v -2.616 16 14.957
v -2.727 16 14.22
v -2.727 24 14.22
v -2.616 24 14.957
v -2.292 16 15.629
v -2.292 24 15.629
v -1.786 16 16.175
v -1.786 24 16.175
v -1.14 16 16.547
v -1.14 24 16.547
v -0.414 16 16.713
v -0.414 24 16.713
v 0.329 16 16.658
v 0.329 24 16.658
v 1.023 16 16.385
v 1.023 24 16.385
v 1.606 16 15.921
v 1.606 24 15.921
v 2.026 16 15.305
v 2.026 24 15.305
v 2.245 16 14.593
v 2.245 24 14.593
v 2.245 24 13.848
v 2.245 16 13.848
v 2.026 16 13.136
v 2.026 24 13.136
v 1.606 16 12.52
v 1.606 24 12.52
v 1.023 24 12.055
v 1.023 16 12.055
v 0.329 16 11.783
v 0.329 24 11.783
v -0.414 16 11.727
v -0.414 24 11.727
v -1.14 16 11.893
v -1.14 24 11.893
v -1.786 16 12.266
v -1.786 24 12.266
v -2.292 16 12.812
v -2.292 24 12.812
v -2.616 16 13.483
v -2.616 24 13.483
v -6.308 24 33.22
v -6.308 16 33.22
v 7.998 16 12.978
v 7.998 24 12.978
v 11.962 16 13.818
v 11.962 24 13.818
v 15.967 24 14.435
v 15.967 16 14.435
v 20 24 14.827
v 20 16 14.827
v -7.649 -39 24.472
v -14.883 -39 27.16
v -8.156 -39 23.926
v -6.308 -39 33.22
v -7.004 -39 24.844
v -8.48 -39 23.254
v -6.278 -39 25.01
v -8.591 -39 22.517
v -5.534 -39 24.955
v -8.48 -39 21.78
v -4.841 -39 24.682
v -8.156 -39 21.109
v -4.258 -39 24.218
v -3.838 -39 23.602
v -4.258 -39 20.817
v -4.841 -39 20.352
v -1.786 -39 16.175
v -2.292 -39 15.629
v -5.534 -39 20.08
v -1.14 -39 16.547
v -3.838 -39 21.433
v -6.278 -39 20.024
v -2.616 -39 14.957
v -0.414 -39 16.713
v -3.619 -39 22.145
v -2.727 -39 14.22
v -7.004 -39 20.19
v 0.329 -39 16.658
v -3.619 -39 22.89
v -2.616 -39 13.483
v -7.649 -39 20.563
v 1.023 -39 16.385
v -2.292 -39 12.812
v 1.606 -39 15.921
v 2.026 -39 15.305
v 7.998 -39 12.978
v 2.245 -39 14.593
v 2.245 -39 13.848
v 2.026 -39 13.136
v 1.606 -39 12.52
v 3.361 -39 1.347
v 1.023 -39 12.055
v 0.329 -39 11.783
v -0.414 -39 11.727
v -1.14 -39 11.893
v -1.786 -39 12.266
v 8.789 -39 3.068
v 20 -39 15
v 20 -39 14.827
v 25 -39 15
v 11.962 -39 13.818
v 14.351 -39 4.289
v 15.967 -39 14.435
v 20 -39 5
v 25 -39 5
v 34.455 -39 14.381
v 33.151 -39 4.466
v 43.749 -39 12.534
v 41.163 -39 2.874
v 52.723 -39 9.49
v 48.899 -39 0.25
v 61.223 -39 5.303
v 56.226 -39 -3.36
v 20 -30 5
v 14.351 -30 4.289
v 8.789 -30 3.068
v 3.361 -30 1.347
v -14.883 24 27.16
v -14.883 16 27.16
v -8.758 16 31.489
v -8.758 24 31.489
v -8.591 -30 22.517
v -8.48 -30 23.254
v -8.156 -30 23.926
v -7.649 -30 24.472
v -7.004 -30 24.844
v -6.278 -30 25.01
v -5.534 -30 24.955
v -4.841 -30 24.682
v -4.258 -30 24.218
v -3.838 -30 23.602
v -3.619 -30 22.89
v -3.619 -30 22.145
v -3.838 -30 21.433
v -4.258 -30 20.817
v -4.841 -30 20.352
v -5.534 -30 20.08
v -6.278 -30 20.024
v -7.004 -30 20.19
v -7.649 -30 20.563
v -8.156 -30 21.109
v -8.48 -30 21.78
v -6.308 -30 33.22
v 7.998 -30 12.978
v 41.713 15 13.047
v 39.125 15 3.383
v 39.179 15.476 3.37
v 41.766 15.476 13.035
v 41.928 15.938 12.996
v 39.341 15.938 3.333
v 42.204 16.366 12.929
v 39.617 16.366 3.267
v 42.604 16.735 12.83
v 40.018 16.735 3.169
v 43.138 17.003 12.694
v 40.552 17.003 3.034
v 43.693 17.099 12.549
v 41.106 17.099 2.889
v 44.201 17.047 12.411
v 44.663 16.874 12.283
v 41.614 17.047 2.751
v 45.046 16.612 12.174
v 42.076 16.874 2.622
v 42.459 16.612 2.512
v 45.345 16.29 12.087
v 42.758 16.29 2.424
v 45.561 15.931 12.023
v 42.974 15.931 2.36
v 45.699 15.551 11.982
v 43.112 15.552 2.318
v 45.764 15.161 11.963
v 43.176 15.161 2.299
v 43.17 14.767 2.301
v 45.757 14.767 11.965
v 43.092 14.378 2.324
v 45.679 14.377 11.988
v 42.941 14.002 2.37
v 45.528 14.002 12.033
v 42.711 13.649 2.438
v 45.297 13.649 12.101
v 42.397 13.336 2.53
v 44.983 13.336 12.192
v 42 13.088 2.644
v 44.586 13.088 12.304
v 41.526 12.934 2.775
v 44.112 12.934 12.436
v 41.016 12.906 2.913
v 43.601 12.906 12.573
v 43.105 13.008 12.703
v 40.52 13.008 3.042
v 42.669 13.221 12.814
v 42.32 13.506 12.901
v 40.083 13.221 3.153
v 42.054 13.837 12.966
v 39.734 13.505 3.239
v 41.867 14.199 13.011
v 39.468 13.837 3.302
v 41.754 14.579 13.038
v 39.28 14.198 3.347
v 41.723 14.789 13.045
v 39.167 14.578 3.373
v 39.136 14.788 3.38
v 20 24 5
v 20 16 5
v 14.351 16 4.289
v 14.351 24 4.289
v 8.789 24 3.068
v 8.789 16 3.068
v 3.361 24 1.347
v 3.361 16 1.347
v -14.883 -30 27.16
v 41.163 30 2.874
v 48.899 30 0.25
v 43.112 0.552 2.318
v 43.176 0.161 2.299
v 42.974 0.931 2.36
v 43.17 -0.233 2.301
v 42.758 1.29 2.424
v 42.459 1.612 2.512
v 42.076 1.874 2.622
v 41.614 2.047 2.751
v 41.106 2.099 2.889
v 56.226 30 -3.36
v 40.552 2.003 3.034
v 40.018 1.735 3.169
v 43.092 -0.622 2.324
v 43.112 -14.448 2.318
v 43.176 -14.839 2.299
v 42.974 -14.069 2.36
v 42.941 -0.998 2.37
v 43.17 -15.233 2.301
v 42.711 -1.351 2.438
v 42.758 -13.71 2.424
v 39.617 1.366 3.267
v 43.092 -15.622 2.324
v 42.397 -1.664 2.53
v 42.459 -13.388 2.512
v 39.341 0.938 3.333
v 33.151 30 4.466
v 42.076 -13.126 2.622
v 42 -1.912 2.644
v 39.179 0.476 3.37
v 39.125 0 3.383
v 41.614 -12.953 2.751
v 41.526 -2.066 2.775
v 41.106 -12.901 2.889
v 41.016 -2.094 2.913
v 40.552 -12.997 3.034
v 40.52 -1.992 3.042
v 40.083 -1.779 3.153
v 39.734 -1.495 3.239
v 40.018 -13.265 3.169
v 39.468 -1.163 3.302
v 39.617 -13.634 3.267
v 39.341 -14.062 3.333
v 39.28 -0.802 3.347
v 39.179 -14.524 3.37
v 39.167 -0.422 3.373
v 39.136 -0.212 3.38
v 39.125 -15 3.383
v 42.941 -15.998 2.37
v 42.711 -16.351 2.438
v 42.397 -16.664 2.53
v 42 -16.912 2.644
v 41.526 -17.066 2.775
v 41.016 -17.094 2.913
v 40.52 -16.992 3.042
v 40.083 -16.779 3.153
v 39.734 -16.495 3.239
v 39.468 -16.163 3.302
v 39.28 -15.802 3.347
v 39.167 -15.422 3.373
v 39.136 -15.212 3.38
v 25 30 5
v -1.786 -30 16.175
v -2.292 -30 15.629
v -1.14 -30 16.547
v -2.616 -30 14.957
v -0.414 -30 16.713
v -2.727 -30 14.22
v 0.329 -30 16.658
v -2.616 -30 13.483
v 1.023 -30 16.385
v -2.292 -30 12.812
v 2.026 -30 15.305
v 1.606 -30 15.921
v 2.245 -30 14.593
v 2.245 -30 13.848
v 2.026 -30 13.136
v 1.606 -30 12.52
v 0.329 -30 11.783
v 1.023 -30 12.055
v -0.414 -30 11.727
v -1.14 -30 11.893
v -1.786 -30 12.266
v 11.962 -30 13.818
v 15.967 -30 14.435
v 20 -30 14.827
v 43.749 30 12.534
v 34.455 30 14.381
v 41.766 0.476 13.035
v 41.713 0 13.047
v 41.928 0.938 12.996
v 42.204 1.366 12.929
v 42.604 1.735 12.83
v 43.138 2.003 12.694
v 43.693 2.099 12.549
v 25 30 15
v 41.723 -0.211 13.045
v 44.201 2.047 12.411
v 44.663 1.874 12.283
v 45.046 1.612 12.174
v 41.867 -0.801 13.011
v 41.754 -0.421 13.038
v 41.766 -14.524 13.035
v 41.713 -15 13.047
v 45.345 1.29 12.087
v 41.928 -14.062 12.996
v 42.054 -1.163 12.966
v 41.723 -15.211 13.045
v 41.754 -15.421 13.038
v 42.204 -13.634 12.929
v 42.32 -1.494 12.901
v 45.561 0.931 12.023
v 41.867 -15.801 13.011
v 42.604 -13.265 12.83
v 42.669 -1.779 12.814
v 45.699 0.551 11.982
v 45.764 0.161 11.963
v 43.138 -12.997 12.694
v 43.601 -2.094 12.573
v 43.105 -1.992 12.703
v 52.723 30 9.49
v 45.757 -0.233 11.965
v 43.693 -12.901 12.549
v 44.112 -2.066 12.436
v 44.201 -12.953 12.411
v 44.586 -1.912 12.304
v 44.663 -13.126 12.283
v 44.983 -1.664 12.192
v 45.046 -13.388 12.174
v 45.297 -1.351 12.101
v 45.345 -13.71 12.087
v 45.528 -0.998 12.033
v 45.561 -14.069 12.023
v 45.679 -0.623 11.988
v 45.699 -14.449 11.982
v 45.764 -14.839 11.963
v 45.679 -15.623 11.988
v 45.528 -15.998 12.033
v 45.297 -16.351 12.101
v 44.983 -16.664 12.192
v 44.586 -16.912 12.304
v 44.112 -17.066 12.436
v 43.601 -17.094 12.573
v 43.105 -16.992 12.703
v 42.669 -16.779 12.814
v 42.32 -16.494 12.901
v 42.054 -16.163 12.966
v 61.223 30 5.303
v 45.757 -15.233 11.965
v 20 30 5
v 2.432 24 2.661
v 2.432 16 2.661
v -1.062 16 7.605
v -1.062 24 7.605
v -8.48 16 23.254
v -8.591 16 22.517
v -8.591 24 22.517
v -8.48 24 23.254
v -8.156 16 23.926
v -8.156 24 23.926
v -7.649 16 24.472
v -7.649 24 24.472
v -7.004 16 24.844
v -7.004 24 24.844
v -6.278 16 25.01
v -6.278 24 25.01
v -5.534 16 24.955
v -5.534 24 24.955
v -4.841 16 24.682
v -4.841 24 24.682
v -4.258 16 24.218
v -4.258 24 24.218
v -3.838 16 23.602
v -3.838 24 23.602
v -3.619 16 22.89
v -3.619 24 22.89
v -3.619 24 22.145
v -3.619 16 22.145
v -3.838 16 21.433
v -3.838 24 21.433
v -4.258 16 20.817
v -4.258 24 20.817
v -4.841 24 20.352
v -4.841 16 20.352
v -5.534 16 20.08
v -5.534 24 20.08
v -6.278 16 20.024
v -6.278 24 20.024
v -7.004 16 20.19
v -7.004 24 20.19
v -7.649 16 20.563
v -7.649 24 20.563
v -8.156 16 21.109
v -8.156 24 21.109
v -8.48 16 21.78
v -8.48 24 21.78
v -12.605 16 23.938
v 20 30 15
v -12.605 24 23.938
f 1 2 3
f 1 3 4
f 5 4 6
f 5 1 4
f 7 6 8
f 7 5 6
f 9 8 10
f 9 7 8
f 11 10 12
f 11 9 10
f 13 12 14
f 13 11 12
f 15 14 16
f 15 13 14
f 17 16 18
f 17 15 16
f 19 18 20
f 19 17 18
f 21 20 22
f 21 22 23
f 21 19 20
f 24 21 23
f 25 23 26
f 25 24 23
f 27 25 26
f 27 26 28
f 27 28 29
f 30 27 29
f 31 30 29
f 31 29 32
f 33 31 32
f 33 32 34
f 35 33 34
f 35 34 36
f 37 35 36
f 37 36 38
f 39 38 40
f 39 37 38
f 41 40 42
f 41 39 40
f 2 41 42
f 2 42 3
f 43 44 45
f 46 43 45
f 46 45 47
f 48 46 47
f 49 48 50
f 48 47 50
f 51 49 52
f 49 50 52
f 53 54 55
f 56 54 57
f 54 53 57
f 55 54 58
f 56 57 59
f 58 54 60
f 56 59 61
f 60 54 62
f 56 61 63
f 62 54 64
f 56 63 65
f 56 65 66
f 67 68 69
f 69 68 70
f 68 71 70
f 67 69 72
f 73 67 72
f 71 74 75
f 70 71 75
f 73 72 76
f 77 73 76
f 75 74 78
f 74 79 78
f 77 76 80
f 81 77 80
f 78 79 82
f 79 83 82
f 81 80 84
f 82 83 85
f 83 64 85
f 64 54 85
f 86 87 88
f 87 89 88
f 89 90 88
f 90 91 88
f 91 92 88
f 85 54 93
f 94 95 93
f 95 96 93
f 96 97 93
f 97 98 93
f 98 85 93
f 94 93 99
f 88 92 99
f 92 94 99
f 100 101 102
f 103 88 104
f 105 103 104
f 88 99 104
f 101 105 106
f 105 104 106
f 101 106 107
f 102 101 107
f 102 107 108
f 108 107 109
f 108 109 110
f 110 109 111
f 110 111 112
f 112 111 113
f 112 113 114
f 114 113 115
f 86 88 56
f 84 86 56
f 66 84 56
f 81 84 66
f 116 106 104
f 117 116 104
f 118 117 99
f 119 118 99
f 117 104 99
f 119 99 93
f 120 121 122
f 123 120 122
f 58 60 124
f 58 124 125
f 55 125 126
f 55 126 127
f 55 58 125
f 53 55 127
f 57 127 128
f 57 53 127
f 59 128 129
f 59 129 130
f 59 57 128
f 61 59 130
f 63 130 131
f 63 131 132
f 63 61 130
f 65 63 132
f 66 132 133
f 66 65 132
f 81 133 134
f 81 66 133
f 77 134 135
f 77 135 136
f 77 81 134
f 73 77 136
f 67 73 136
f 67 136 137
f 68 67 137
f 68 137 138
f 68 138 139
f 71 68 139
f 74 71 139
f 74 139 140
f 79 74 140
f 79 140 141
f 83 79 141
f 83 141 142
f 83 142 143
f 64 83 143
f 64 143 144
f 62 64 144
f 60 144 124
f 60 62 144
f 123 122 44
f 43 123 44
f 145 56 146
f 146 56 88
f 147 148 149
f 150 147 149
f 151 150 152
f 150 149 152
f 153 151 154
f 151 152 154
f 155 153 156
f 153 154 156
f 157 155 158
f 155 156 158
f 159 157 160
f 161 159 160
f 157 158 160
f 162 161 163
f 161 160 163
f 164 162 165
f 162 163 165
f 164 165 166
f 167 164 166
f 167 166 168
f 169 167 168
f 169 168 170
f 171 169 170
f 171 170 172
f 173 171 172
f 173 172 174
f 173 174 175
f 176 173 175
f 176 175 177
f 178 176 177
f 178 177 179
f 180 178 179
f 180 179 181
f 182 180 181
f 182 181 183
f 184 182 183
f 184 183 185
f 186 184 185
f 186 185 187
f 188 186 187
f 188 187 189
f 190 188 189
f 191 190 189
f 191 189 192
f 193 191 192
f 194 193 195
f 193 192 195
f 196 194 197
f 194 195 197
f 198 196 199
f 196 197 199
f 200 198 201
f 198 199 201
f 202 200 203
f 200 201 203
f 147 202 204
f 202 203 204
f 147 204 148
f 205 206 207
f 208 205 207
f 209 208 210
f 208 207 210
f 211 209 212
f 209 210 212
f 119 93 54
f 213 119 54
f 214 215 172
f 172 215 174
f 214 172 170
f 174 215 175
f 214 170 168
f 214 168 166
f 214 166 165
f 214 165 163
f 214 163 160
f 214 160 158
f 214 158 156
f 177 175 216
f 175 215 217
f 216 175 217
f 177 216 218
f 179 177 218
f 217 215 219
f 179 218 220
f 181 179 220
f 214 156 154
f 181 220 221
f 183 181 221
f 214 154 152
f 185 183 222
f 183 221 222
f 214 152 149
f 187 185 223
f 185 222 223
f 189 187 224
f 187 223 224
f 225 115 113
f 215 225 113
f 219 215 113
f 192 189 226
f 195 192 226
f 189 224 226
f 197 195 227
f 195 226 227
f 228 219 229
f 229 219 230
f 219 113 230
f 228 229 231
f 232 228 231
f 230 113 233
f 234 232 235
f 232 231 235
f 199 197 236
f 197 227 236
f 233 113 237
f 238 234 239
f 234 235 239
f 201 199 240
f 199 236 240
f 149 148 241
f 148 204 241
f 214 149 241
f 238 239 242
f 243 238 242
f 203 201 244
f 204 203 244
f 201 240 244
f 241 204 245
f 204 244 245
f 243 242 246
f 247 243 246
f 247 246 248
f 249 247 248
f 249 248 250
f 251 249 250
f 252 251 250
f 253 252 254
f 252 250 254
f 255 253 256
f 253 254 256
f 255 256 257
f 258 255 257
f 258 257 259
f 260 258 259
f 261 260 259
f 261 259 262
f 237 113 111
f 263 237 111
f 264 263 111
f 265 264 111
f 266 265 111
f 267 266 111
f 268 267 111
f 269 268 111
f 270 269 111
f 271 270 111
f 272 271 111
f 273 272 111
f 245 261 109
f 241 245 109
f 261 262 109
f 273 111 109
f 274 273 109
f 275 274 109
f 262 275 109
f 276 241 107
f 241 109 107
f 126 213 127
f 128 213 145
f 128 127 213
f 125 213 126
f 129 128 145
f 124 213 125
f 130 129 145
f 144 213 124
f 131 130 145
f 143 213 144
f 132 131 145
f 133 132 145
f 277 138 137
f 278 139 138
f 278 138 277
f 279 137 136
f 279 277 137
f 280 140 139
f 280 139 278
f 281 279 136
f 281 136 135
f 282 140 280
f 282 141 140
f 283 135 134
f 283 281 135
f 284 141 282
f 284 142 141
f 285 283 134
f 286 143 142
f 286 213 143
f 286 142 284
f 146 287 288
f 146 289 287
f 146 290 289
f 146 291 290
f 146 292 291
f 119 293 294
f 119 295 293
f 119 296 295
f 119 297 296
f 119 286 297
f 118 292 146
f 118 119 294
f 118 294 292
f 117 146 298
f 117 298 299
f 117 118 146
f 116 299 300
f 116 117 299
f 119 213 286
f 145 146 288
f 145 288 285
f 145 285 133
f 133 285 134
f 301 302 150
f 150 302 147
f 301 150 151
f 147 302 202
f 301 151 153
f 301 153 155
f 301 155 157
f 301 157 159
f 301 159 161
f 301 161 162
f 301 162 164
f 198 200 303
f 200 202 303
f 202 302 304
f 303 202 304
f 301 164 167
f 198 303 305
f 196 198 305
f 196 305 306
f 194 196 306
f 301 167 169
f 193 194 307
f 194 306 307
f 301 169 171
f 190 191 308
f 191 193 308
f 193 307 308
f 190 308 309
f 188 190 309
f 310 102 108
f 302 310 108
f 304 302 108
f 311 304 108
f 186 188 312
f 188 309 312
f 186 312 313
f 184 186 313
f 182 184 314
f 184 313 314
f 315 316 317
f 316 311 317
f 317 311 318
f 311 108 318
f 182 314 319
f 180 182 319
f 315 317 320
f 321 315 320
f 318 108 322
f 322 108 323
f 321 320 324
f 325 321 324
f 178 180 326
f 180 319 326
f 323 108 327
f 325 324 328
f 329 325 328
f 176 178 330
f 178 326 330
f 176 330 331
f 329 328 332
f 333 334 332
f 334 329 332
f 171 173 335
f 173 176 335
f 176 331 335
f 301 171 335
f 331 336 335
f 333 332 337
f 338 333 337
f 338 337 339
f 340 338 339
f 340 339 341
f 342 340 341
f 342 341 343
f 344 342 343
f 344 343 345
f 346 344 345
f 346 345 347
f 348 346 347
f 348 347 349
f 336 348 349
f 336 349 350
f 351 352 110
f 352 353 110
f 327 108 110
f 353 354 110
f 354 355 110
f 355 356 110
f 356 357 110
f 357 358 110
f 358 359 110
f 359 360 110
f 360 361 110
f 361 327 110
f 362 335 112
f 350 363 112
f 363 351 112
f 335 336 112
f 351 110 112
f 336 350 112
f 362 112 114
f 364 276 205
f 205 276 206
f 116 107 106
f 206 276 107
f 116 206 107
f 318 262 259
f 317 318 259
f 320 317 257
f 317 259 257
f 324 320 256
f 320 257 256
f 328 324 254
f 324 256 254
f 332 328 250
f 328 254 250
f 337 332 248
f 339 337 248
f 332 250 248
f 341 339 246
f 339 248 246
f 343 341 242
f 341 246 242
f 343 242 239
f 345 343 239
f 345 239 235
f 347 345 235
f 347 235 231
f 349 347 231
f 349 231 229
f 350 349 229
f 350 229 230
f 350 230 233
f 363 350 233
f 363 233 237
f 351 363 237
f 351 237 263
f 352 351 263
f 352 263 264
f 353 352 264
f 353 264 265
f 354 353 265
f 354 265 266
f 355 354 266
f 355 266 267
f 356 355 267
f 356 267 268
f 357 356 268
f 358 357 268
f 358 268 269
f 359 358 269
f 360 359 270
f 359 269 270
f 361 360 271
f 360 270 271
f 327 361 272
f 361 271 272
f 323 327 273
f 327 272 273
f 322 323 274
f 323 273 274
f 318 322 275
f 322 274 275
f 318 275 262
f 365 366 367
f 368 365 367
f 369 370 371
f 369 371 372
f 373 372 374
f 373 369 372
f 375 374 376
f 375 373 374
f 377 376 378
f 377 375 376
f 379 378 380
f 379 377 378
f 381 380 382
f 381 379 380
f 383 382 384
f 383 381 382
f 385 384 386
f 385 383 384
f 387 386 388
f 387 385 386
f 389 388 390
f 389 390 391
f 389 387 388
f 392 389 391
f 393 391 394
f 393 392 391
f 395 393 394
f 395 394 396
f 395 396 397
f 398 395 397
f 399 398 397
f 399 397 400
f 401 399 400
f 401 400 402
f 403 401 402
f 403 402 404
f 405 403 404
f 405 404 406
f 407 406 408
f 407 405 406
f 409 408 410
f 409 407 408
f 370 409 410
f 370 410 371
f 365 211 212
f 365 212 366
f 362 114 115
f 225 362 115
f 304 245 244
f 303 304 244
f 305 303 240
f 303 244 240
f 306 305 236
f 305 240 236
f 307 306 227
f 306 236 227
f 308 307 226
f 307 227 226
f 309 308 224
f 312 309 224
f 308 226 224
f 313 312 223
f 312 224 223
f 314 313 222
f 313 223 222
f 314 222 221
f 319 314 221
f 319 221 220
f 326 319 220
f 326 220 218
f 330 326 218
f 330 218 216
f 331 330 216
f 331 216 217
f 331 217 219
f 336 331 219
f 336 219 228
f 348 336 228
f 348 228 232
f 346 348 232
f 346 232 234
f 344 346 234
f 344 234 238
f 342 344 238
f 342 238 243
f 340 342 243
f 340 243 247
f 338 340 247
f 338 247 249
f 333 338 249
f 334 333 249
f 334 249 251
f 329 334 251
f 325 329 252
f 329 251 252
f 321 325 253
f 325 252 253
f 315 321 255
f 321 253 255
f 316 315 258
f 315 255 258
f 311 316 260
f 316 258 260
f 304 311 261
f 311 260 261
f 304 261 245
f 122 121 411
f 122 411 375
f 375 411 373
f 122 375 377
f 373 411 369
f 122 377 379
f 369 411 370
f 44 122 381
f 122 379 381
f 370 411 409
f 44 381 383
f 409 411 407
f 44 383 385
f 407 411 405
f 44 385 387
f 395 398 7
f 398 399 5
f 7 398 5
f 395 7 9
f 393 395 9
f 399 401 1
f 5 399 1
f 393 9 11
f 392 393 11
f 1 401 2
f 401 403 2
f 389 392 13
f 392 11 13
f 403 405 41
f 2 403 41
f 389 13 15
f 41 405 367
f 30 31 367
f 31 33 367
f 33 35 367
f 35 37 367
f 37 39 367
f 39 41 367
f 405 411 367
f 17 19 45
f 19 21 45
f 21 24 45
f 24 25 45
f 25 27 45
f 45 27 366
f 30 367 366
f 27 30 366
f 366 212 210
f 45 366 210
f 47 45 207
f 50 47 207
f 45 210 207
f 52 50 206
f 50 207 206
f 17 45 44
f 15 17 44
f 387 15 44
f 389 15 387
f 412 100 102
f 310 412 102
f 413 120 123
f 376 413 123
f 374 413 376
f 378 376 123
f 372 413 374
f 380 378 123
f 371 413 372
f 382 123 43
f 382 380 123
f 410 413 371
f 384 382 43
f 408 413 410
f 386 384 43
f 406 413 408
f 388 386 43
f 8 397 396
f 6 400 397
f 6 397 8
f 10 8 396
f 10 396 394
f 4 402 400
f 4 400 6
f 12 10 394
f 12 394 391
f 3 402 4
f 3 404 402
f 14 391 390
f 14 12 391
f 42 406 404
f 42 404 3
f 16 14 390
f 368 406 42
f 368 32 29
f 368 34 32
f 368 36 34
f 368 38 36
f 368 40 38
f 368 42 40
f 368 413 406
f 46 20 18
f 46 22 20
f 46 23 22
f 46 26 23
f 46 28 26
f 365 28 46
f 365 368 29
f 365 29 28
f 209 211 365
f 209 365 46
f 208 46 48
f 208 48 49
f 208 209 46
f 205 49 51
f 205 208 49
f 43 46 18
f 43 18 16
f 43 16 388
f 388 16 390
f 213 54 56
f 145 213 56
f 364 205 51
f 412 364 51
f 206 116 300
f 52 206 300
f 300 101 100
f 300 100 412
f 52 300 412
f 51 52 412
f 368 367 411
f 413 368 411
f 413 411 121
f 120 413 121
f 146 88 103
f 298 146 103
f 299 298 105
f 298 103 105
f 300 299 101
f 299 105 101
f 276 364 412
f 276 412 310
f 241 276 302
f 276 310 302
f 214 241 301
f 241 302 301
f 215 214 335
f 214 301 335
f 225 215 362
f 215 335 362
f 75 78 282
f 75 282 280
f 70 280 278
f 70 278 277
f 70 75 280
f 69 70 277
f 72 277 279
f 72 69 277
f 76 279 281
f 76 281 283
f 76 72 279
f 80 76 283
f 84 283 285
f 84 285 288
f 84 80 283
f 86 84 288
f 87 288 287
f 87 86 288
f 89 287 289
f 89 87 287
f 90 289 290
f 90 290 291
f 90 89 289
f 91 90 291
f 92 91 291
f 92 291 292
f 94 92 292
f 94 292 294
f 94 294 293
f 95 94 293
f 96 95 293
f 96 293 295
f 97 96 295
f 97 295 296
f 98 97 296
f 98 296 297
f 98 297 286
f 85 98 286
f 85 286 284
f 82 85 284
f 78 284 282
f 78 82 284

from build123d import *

# Parameters (mm, degrees)
BOSS_EXTRUDE2_DEPTH = 20
FILLET1_RADIUS      = 10
FILLET1_LENGTH      = 5
FILLET2_RADIUS      = 10
FILLET2_LENGTH      = 5
SKETCH5_R           = 1
SKETCH5_R_2         = 5.5
CUT_EXTRUDE5_DEPTH  = 69.007352544
CUT_EXTRUDE7_DEPTH  = 25
FILLET5_R           = 10
BOSS_EXTRUDE5_DEPTH = 60
SKETCH13_R          = 2.1
CUT_EXTRUDE8_DEPTH  = 60
CUT_EXTRUDE9_DEPTH  = 60
CUT_EXTRUDE10_DEPTH = 60
SKETCH17_R          = 2.5
BOSS_EXTRUDE6_DEPTH = 8
SKETCH18_R          = 2.5
BOSS_EXTRUDE7_DEPTH = 9


with BuildPart() as part:
    # Sketch1 → Boss-Extrude2 (new body)
    with BuildSketch(Plane.XY):
        Polygon((-25, 30), (25, 30), (25, -30), (-25, -30), (-25, -25), (-20, -25), (20, -25), (20, 25), (-20, 25), (-25, 25), align=None)
    extrude(amount=BOSS_EXTRUDE2_DEPTH)

    # Fillet1: full round fillet: the end face becomes a half cylinder, R = half its width
    fillet1_face = Plane((-25, 27.5, 10), x_dir=(0, -1, 0), z_dir=(-1, 0, 0))  # on the end face: x along it, z out of the body
    fillet1_slab = fillet1_face.offset(-FILLET1_RADIUS / 2) * Box(FILLET1_LENGTH, 2 * FILLET1_RADIUS, FILLET1_RADIUS, mode=Mode.PRIVATE)  # the body's end, R deep
    fillet1_round = Plane((-15, 27.5, 10), x_dir=(-1, 0, 0), z_dir=(0, -1, 0)) * Cylinder(FILLET1_RADIUS, FILLET1_LENGTH, mode=Mode.PRIVATE)  # its axis R under the face
    add(fillet1_slab - fillet1_round, mode=Mode.SUBTRACT)

    # Fillet2: full round fillet: the end face becomes a half cylinder, R = half its width
    fillet2_face = Plane((-25, -27.5, 10), x_dir=(0, -1, 0), z_dir=(-1, 0, 0))  # on the end face: x along it, z out of the body
    fillet2_slab = fillet2_face.offset(-FILLET2_RADIUS / 2) * Box(FILLET2_LENGTH, 2 * FILLET2_RADIUS, FILLET2_RADIUS, mode=Mode.PRIVATE)  # the body's end, R deep
    fillet2_round = Plane((-15, -27.5, 10), x_dir=(-1, 0, 0), z_dir=(0, -1, 0)) * Cylinder(FILLET2_RADIUS, FILLET2_LENGTH, mode=Mode.PRIVATE)  # its axis R under the face
    add(fillet2_slab - fillet2_round, mode=Mode.SUBTRACT)

    # Sketch5 → Cut-Extrude5 (cut, through all)
    with BuildSketch(Plane(origin=(0, 30, 0), x_dir=(1, 0, 0), z_dir=(0, 1, 0))):
        with Locations(Location((-15, -3, 0), (0, 0, 180))):
            Circle(SKETCH5_R)
        with Locations(Location((-22, -10, 0), (0, 0, 180))):
            Circle(SKETCH5_R)
        with Locations(Location((-15, -17, 0), (0, 0, 180))):
            Circle(SKETCH5_R)
        with Locations(Location((-8, -10, 0), (0, 0, 180))):
            Circle(SKETCH5_R)
        with Locations(Location((-15, -10, 0), (0, 0, 180))):
            Circle(SKETCH5_R_2)
    extrude(amount=-CUT_EXTRUDE5_DEPTH, mode=Mode.SUBTRACT)

    # Sketch10 → Cut-Extrude7 (cut)
    with BuildSketch(Plane(origin=(25, 0, 0), x_dir=(0, 0, -1), z_dir=(1, 0, 0))):
        Polygon((-15, 28.180148829), (-15, -28.180148829), (-15, -30), (-20, -30), (-20, 30), (-15, 30), align=None)
        Polygon((-5, 28.180148829), (-5, -28.180148829), (-5, -30), (0, -30), (0, 30), (-5, 30), align=None)
    extrude(amount=-CUT_EXTRUDE7_DEPTH, mode=Mode.SUBTRACT)

    # Fillet5
    # the kernel refuses this fillet: 10 mm, written as the material it adds along each edge
    with BuildSketch(Plane(origin=(0, 25, 15), x_dir=(1, 0, 0), z_dir=(0, 1, 0)), Plane(origin=(0, -30, 15), x_dir=(1, 0, 0), z_dir=(0, 1, 0)), Plane(origin=(0, -25, 5), x_dir=(1, 0, 0), z_dir=(0, -1, 0))) as fillet5_piece_1:
        with BuildLine():
            CenterArc((8.660254038, -10), FILLET5_R, 90, 60)
            Line((0, -5), (-0.173205081, -4.9))
            ThreePointArc((-0.173205081, -4.9), (-0.2, -2.5), (-0.2, 0))
            Line((-0.2, 0), (0, 0.2))
            Line((0, 0.2), (8.660254038, 0.2))
            Line((8.660254038, 0.2), (8.660254038, 0))
        make_face()
    extrude(amount=5)
    with BuildSketch(Plane(origin=(0, 30, 5), x_dir=(0, 0, -1), z_dir=(0, -1, 0))) as fillet5_piece_2:
        with BuildLine():
            CenterArc((10, 8.660254038), FILLET5_R, 180, 60)
            Line((0, 8.660254038), (-0.2, 8.660254038))
            Line((-0.2, 8.660254038), (-0.2, 0))
            Line((-0.2, 0), (0, -0.2))
            ThreePointArc((0, -0.2), (2.5, -0.2), (4.9, -0.173205081))
            Line((4.9, -0.173205081), (5, 0))
        make_face()
    extrude(amount=5)

    # Sketch12 → Boss-Extrude5 (add)
    with BuildSketch(Plane.XZ.offset(30)):
        with BuildLine():
            Line((56.226298398, -3.359735054), (61.222506141, 5.302707337))
            ThreePointArc((61.222506141, 5.302707337), (43.74904955, 12.533728595), (25, 15))
            Line((25, 15), (25, 5))
            ThreePointArc((25, 5), (41.16297375, 2.873903962), (56.226298398, -3.359735054))
        make_face()
    extrude(amount=-BOSS_EXTRUDE5_DEPTH)

    # Sketch13 → Cut-Extrude8 (cut)
    with BuildSketch(Plane(origin=(2.920998947, 0, 10.910870277), x_dir=(-0.9659824633840055, 0, 0.2586075800021504), z_dir=(-0.2586075800021504, 0, -0.9659824633840055))):
        with Locations((-39.019497435, 15)):
            Circle(SKETCH13_R)
        with Locations((-39.019497435, 0)):
            Circle(SKETCH13_R)
        with Locations((-39.019497435, -15)):
            Circle(SKETCH13_R)
    extrude(amount=-CUT_EXTRUDE8_DEPTH, mode=Mode.SUBTRACT)

    # Sketch15 → Cut-Extrude9 (cut)
    with BuildSketch(Plane(origin=(0, 30, 0), x_dir=(1, 0, 0), z_dir=(0, 1, 0))):
        with BuildLine():
            Line((8.660254038, -5), (8.660254038, -15))
            ThreePointArc((8.660254038, -15), (-39.182795974, -10), (8.660254038, -5))
        make_face()
    extrude(amount=-CUT_EXTRUDE9_DEPTH, mode=Mode.SUBTRACT)

    # Sketch16 → Cut-Extrude10 (cut)
    with BuildSketch(Plane(origin=(0, 30, 0), x_dir=(1, 0, 0), z_dir=(0, 1, 0))):
        Polygon((-6.307906019, -33.220384693), (8.660254038, -15), (20.000254038, -15), (20.000254038, -5), (8.660254038, -5), (3.496355525, -1.350438774), (-14.790578774, -27.225295226), align=None)
    extrude(amount=-CUT_EXTRUDE10_DEPTH, mode=Mode.SUBTRACT)

    # Sketch17 → Boss-Extrude6 (add)
    # profile 1 of 2: a face of its own
    with BuildSketch(Plane(origin=(0, 16, 0), x_dir=(1, 0, 0), z_dir=(0, 1, 0))):
        Polygon((2.432023453, -2.661202229), (-1.062108246, -7.605177784), (-12.605177784, -23.937891754), (-14.882580853, -27.160273185), (-8.757813114, -31.488924262), (-6.307906019, -33.220384693), (7.998117102, -12.978265997), (11.006698288, -8.721313737), align=None)
        with Locations(Location((-6.090722034, -22.517234763, 0), (0, 0, 180))):
            Circle(SKETCH17_R, mode=Mode.SUBTRACT)
        with Locations(Location((-0.226842709, -14.220216066, 0), (0, 0, 180))):
            Circle(SKETCH17_R, mode=Mode.SUBTRACT)
    # profile 2 of 2: a face of its own
    with BuildSketch(Plane(origin=(0, 16, 0), x_dir=(1, 0, 0), z_dir=(0, 1, 0))):
        with BuildLine():
            Line((3.360713643, -1.347164296), (2.432023453, -2.661202229))
            Line((2.432023453, -2.661202229), (11.006698288, -8.721313737))
            Line((11.006698288, -8.721313737), (7.998117102, -12.978265997))
            ThreePointArc((7.998117102, -12.978265997), (13.960401245, -14.154569005), (20.000254038, -14.827398269))
            Line((20.000254038, -14.827398269), (20.000254038, -5))
            ThreePointArc((20.000254038, -5), (11.555844657, -3.741343444), (3.360713643, -1.347164296))
        make_face()
    extrude(amount=BOSS_EXTRUDE6_DEPTH)

    # Sketch18 → Boss-Extrude7 (add)
    with BuildSketch(Plane(origin=(0, -39, 0), x_dir=(1, 0, 0), z_dir=(0, 1, 0))):
        with BuildLine():
            Line((3.360713643, -1.347164296), (-14.882580853, -27.160273185))
            Line((-14.882580853, -27.160273185), (-6.307906019, -33.220384693))
            Line((-6.307906019, -33.220384693), (7.998117102, -12.978265997))
            ThreePointArc((7.998117102, -12.978265997), (13.960401245, -14.154569005), (20.000254038, -14.827398269))
            Line((20.000254038, -14.827398269), (20.000254038, -15))
            Line((20.000254038, -15), (25, -15))
            ThreePointArc((25, -15), (43.74904955, -12.533728595), (61.222506141, -5.302707337))
            Line((61.222506141, -5.302707337), (56.226298398, 3.359735054))
            ThreePointArc((56.226298398, 3.359735054), (41.16297375, -2.873903962), (25, -5))
            Line((25, -5), (20.000254038, -5))
            ThreePointArc((20.000254038, -5), (11.555844657, -3.741343444), (3.360713643, -1.347164296))
        make_face()
        with Locations(Location((-6.090722034, -22.517234763, 0), (0, 0, 180))):
            Circle(SKETCH18_R, mode=Mode.SUBTRACT)
        with Locations(Location((-0.226842709, -14.220216066, 0), (0, 0, 180))):
            Circle(SKETCH18_R, mode=Mode.SUBTRACT)
    extrude(amount=BOSS_EXTRUDE7_DEPTH)


solid = part.part
